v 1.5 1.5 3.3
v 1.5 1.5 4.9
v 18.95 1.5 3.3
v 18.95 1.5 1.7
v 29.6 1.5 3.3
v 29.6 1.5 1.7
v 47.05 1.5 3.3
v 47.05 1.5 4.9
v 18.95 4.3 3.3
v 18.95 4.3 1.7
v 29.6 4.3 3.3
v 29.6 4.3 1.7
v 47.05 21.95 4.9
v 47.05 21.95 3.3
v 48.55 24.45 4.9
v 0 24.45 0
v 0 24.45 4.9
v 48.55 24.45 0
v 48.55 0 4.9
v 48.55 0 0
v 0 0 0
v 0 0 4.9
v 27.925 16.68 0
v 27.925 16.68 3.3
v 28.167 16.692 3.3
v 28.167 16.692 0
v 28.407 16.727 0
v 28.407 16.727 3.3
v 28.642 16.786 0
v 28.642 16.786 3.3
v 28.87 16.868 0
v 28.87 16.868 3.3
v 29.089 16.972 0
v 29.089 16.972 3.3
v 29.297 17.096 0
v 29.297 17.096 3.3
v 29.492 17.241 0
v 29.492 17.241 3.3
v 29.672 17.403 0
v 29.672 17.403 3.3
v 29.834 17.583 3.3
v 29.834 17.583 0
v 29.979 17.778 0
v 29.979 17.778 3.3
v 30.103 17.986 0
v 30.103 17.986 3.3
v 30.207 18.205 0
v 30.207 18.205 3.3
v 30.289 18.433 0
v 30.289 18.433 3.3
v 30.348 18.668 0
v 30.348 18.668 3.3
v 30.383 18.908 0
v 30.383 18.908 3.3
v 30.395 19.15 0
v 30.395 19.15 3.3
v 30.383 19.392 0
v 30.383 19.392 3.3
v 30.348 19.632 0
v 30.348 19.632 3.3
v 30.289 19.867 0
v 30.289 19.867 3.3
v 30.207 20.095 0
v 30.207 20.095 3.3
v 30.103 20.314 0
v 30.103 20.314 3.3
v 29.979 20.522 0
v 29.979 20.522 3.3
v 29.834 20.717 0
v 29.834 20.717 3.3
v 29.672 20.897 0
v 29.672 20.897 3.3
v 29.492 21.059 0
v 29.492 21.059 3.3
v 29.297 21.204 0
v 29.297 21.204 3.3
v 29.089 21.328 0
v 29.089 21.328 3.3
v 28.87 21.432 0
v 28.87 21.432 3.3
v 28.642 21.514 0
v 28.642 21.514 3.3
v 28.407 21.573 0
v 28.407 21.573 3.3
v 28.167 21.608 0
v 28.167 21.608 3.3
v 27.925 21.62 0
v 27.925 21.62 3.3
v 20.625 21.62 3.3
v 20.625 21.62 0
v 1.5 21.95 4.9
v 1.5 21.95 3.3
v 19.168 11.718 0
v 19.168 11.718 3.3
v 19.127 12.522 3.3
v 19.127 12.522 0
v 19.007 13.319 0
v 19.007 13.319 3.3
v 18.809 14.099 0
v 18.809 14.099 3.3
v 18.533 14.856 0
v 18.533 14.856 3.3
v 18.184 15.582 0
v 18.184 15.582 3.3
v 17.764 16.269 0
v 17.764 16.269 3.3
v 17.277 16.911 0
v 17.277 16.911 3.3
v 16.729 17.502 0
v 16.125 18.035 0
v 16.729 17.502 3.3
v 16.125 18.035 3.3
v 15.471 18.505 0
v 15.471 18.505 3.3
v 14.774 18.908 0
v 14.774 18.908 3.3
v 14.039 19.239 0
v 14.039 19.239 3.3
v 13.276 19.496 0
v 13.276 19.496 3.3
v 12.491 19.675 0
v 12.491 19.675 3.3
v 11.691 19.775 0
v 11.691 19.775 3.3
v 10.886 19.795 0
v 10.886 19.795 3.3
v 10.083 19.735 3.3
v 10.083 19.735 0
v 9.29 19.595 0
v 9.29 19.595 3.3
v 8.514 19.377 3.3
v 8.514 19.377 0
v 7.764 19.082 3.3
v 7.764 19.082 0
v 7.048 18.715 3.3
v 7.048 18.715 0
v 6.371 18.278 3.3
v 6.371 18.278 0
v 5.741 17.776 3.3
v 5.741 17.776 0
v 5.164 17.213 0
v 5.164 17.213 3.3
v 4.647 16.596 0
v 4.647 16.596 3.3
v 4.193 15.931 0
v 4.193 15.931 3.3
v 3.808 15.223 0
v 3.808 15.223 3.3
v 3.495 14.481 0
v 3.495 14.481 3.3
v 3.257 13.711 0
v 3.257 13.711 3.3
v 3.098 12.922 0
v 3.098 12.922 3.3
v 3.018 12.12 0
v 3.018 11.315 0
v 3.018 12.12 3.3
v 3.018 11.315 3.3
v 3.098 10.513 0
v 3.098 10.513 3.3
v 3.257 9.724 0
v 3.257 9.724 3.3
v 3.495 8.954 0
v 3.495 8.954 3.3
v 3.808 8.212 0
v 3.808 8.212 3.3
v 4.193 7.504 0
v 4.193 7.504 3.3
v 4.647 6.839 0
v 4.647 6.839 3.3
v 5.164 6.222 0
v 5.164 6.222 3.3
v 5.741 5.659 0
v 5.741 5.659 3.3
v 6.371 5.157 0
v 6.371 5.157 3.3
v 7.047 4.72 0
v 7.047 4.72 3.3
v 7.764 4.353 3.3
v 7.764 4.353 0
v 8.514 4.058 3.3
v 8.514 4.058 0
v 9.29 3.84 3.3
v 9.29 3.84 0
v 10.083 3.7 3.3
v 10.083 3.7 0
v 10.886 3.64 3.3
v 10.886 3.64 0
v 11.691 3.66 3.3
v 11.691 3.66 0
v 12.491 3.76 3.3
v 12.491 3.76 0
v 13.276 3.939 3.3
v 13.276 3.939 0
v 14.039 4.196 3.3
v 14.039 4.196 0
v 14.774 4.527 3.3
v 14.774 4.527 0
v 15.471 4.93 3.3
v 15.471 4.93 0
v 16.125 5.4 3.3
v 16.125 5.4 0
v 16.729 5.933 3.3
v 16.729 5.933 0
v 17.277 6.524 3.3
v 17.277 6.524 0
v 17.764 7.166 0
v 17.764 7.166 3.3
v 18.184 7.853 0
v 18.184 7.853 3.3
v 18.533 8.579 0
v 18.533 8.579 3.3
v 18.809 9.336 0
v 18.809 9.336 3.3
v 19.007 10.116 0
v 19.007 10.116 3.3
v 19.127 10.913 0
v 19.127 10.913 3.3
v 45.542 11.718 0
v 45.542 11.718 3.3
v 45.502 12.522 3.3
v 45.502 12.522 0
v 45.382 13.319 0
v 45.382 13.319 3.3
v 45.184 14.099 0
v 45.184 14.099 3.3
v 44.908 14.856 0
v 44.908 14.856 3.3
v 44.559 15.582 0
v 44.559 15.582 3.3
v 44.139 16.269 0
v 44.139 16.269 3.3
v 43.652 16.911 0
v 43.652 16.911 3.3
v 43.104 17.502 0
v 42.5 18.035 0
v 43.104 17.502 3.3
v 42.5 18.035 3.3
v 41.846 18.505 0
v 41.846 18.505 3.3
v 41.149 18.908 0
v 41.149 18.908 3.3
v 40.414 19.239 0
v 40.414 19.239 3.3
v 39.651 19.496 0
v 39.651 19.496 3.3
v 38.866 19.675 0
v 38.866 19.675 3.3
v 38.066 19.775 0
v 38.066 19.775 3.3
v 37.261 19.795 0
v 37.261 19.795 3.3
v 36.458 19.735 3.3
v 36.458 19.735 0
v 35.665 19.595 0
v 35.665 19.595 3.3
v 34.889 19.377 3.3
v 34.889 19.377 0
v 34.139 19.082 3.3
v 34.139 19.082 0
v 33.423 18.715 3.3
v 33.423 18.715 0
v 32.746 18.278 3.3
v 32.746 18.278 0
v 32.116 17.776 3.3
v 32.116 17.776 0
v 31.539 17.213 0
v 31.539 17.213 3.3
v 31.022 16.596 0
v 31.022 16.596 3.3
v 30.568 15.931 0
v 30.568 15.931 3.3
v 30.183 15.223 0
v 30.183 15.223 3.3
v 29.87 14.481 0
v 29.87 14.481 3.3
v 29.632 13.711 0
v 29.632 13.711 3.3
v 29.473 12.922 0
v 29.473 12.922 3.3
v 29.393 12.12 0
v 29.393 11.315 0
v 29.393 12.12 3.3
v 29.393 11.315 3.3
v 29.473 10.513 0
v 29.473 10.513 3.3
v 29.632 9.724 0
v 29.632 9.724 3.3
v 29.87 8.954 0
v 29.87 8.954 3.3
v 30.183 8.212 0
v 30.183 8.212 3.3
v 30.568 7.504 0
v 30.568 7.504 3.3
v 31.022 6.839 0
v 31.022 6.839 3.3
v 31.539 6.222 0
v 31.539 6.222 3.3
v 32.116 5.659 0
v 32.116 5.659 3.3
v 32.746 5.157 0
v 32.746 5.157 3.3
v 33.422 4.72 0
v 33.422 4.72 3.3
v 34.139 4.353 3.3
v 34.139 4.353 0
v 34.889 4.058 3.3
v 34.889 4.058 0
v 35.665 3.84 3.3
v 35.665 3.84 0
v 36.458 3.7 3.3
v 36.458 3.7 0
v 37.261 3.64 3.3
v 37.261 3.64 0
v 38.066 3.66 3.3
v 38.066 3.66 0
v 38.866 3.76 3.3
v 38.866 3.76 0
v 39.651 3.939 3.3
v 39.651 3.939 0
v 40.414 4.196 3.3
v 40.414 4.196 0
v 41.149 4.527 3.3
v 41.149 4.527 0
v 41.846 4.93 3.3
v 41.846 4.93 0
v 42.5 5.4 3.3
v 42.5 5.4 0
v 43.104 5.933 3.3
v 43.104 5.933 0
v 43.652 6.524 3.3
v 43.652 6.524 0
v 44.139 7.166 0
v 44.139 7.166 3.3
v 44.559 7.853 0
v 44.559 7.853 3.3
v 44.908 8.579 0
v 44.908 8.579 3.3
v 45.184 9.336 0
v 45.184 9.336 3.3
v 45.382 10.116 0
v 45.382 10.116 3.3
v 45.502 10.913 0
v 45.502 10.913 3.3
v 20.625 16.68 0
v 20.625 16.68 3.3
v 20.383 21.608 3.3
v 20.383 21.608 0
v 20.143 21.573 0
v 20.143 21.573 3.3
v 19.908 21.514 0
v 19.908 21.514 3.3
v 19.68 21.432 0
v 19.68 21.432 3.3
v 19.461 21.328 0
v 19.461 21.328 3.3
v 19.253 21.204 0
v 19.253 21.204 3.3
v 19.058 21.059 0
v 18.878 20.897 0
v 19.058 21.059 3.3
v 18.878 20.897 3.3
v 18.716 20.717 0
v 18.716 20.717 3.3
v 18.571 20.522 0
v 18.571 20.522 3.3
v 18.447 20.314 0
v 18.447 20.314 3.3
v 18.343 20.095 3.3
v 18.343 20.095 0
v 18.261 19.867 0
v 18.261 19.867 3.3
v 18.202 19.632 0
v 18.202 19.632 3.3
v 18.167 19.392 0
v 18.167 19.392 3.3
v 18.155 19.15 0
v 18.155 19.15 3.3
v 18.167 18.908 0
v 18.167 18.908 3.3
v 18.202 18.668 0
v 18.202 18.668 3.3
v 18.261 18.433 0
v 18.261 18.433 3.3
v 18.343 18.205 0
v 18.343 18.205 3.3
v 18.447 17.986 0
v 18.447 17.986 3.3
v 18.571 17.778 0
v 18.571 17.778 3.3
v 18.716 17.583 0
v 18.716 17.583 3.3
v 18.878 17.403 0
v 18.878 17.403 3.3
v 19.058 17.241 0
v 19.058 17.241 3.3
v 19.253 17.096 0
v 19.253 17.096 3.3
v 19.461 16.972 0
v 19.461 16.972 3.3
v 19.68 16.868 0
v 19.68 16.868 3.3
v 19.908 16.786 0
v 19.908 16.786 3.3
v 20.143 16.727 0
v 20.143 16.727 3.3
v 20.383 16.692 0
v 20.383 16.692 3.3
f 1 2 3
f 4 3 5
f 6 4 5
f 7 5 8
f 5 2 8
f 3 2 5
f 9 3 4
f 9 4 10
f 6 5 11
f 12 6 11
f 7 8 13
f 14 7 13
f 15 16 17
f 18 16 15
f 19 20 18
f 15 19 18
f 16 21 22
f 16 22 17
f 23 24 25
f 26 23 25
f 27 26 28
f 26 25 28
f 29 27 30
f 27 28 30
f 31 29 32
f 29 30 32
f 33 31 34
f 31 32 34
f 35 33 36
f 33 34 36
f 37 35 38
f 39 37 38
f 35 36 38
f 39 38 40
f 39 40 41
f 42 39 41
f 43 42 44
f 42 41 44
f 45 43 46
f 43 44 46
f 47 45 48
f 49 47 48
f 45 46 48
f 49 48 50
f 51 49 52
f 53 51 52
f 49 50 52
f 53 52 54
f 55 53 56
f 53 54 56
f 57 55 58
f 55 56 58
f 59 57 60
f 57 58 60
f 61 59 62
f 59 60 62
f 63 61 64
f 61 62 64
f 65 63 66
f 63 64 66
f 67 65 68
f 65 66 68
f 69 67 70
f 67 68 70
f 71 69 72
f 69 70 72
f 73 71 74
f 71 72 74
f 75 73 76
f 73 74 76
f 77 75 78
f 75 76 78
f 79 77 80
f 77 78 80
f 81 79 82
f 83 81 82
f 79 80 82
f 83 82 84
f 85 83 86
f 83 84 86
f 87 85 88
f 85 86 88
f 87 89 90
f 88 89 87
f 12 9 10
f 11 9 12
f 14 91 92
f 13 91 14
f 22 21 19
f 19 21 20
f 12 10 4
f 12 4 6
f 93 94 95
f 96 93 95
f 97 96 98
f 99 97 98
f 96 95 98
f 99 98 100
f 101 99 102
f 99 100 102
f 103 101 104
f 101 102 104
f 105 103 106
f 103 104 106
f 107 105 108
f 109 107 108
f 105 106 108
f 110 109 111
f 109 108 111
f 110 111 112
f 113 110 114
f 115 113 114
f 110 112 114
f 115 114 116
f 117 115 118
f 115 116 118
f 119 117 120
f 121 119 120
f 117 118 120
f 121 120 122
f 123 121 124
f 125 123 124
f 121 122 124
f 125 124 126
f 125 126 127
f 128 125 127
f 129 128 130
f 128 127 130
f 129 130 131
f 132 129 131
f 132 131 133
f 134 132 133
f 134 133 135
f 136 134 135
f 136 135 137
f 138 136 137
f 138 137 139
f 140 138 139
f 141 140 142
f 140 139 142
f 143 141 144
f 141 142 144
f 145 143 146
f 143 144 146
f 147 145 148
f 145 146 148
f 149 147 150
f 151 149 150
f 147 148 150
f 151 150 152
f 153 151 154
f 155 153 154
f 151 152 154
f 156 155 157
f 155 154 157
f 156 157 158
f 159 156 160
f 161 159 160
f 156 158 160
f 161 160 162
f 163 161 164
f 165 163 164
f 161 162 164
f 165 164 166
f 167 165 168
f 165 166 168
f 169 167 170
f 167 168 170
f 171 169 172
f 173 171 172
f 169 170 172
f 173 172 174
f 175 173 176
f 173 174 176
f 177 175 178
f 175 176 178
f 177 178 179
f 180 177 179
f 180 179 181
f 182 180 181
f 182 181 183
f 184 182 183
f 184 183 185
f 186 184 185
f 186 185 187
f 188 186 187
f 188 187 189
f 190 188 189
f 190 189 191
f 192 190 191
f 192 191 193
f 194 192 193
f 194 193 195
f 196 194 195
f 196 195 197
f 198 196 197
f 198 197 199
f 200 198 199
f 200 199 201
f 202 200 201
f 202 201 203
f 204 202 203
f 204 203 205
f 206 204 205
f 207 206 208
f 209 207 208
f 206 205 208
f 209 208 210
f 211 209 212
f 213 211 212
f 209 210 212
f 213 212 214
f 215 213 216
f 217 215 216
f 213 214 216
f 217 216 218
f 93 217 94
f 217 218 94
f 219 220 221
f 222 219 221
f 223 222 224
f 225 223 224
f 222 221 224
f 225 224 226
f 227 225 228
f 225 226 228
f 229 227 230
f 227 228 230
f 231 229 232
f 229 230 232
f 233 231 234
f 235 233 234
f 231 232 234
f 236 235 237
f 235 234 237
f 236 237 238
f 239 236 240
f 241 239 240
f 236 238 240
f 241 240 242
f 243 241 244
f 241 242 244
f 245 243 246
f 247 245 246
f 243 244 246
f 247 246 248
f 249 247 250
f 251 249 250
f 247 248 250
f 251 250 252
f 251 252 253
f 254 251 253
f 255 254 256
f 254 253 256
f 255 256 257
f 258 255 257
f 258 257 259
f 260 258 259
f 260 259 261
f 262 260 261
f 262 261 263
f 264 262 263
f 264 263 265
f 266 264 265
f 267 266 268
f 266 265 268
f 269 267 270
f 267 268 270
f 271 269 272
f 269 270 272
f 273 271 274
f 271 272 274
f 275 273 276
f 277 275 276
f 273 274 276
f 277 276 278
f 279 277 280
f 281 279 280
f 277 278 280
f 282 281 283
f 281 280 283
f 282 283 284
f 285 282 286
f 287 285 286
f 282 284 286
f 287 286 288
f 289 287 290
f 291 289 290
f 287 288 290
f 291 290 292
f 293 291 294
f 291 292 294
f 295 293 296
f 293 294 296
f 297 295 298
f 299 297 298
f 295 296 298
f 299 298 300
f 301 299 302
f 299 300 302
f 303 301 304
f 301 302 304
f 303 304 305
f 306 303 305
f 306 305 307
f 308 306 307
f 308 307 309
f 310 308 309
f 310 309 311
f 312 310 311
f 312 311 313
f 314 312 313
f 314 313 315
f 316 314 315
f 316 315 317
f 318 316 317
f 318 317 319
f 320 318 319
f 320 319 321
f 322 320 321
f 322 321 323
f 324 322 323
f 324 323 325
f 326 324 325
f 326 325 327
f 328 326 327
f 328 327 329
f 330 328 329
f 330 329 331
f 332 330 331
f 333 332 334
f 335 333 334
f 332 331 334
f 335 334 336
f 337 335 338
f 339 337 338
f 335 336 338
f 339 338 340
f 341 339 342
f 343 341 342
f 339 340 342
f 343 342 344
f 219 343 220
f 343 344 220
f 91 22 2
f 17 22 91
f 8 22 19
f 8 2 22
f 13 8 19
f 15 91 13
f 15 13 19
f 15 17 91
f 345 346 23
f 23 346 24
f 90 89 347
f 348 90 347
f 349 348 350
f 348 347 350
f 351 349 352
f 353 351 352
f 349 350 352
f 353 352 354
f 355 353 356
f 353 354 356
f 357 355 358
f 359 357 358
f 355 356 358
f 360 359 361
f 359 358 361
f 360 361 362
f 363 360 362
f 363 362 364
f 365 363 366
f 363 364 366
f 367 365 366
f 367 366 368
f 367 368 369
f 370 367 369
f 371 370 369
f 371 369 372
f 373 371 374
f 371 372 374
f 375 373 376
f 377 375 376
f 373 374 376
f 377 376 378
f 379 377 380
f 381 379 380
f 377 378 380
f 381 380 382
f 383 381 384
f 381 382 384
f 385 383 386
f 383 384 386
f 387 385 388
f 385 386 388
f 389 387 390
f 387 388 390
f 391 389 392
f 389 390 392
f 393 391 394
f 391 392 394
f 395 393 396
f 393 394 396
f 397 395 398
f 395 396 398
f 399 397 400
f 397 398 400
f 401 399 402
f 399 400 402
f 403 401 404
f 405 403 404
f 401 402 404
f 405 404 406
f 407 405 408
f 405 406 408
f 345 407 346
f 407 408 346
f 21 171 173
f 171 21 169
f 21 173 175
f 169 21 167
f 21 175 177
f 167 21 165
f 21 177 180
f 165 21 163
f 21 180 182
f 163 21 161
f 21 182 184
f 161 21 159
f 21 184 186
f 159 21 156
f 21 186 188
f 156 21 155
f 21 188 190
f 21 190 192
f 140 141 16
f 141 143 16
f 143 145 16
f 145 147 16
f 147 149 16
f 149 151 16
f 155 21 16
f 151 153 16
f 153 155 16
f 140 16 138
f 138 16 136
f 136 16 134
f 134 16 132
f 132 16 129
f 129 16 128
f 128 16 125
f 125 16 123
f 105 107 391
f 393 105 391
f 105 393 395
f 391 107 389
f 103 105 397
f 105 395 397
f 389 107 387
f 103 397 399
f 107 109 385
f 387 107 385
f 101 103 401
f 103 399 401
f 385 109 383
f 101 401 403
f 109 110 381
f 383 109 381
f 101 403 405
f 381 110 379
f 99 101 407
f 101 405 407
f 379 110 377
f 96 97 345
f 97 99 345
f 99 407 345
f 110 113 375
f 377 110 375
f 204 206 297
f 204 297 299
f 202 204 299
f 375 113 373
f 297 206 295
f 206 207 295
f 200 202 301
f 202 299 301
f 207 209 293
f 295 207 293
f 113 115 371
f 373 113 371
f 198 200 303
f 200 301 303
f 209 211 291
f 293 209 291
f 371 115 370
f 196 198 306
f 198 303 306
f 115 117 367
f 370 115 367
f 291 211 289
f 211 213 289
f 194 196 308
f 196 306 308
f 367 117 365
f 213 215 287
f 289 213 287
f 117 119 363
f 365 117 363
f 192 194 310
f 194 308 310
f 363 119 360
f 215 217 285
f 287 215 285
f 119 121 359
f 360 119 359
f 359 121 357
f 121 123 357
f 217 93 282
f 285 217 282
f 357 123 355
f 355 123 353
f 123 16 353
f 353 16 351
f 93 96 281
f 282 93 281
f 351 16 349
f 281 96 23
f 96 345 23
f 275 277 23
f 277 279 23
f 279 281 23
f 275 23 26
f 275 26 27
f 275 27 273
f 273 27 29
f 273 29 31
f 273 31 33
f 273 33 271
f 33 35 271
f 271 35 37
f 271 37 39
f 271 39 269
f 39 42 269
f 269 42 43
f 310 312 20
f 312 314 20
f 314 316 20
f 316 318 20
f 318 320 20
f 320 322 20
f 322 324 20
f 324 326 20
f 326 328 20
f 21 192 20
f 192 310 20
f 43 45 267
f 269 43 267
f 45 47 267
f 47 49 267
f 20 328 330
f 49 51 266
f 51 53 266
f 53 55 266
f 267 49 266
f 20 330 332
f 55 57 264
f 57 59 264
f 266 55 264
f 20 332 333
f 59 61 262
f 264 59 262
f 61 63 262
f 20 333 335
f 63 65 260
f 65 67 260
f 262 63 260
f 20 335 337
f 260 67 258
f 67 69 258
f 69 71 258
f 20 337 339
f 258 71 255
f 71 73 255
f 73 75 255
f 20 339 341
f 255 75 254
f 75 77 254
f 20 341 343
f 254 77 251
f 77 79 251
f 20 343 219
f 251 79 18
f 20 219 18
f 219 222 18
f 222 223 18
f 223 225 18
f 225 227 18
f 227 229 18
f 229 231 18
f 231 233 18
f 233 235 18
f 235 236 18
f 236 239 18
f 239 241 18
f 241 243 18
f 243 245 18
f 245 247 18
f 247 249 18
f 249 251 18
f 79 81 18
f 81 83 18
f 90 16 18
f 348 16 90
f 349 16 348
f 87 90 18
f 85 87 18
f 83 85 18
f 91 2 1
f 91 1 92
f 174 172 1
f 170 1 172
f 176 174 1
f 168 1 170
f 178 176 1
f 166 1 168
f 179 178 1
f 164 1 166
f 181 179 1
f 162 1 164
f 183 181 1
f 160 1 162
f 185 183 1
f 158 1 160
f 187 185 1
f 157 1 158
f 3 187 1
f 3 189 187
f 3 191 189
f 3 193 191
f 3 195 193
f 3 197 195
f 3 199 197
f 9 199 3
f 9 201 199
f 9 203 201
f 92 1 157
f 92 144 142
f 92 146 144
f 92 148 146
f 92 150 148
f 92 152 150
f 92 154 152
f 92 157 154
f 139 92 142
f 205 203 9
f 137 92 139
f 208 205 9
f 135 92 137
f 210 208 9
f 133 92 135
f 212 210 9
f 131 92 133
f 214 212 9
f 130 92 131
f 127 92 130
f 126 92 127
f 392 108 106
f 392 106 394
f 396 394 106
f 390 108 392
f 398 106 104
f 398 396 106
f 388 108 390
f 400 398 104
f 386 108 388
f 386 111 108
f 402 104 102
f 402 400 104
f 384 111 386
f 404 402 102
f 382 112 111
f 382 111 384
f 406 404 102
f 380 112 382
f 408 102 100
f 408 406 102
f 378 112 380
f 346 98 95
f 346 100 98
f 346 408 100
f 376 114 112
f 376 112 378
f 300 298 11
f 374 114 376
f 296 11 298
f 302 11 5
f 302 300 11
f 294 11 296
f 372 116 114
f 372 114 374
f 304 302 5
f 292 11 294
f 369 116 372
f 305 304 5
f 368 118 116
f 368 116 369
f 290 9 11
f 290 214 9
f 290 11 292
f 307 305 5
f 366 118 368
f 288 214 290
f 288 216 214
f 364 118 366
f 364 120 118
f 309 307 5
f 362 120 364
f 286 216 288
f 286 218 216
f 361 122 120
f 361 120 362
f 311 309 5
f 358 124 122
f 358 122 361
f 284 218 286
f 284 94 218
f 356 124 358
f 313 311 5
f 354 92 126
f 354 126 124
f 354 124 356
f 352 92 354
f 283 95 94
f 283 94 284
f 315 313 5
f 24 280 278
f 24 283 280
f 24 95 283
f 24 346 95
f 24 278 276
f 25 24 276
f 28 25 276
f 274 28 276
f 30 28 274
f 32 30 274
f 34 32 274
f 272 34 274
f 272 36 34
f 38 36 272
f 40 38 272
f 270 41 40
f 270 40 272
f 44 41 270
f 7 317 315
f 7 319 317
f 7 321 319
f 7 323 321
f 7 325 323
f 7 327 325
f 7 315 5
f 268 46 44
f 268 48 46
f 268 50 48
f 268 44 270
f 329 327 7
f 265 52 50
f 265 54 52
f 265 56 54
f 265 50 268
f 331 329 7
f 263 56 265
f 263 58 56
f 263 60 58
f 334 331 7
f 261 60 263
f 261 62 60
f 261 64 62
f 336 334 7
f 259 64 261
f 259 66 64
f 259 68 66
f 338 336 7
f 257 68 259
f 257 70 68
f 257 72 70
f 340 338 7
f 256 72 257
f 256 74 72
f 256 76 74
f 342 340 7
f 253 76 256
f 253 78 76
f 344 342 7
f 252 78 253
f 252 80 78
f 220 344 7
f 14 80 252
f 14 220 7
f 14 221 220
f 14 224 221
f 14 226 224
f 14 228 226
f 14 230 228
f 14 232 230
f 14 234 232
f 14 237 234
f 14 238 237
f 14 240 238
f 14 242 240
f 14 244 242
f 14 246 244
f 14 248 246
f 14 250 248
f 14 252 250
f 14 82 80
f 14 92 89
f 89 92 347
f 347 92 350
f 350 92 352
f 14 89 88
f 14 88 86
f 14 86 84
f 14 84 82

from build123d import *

# Parameters (mm, degrees)
SKETCH_W        = 48.55
SKETCH_H        = 24.45
PAD_DEPTH       = 4.9
SKETCH001_W     = 45.55
SKETCH001_H     = 20.45
POCKET_DEPTH    = 1.6
SKETCH002_R     = 8.08
POCKET001_DEPTH = 3.3
SKETCH003_W     = 10.65
SKETCH003_H     = 2.8
POCKET002_DEPTH = 1.6


with BuildPart() as part:
    # Sketch → Pad (new body)
    with BuildSketch(Plane.XY):
        with Locations((24.275, 12.225)):
            Rectangle(SKETCH_W, SKETCH_H)
    extrude(amount=PAD_DEPTH)

    # Sketch001 → Pocket (cut)
    with BuildSketch(Plane.XY.offset(4.9)):
        with Locations((24.275, 11.725)):
            Rectangle(SKETCH001_W, SKETCH001_H)
    extrude(amount=-POCKET_DEPTH, mode=Mode.SUBTRACT)

    # Sketch002 → Pocket001 (cut)
    with BuildSketch(Plane.XY.offset(3.3)):
        with Locations((11.0875, 11.7175)):
            Circle(SKETCH002_R)
        with Locations((37.4625, 11.7175)):
            Circle(SKETCH002_R)
        with BuildLine():
            Line((20.624978, 21.62), (27.924978, 21.62))
            ThreePointArc((27.925, 16.68), (30.394994, 19.150011), (27.924978, 21.62))
            Line((20.625, 16.68), (27.925, 16.68))
            ThreePointArc((20.624978, 21.62), (18.154979, 19.149989), (20.625, 16.68))
        make_face()
    extrude(amount=-POCKET001_DEPTH, mode=Mode.SUBTRACT)

    # Sketch003 → Pocket002 (cut)
    with BuildSketch(Plane.XY.offset(3.3)):
        with Locations((24.275, 2.9)):
            Rectangle(SKETCH003_W, SKETCH003_H)
    extrude(amount=-POCKET002_DEPTH, mode=Mode.SUBTRACT)


solid = part.part
